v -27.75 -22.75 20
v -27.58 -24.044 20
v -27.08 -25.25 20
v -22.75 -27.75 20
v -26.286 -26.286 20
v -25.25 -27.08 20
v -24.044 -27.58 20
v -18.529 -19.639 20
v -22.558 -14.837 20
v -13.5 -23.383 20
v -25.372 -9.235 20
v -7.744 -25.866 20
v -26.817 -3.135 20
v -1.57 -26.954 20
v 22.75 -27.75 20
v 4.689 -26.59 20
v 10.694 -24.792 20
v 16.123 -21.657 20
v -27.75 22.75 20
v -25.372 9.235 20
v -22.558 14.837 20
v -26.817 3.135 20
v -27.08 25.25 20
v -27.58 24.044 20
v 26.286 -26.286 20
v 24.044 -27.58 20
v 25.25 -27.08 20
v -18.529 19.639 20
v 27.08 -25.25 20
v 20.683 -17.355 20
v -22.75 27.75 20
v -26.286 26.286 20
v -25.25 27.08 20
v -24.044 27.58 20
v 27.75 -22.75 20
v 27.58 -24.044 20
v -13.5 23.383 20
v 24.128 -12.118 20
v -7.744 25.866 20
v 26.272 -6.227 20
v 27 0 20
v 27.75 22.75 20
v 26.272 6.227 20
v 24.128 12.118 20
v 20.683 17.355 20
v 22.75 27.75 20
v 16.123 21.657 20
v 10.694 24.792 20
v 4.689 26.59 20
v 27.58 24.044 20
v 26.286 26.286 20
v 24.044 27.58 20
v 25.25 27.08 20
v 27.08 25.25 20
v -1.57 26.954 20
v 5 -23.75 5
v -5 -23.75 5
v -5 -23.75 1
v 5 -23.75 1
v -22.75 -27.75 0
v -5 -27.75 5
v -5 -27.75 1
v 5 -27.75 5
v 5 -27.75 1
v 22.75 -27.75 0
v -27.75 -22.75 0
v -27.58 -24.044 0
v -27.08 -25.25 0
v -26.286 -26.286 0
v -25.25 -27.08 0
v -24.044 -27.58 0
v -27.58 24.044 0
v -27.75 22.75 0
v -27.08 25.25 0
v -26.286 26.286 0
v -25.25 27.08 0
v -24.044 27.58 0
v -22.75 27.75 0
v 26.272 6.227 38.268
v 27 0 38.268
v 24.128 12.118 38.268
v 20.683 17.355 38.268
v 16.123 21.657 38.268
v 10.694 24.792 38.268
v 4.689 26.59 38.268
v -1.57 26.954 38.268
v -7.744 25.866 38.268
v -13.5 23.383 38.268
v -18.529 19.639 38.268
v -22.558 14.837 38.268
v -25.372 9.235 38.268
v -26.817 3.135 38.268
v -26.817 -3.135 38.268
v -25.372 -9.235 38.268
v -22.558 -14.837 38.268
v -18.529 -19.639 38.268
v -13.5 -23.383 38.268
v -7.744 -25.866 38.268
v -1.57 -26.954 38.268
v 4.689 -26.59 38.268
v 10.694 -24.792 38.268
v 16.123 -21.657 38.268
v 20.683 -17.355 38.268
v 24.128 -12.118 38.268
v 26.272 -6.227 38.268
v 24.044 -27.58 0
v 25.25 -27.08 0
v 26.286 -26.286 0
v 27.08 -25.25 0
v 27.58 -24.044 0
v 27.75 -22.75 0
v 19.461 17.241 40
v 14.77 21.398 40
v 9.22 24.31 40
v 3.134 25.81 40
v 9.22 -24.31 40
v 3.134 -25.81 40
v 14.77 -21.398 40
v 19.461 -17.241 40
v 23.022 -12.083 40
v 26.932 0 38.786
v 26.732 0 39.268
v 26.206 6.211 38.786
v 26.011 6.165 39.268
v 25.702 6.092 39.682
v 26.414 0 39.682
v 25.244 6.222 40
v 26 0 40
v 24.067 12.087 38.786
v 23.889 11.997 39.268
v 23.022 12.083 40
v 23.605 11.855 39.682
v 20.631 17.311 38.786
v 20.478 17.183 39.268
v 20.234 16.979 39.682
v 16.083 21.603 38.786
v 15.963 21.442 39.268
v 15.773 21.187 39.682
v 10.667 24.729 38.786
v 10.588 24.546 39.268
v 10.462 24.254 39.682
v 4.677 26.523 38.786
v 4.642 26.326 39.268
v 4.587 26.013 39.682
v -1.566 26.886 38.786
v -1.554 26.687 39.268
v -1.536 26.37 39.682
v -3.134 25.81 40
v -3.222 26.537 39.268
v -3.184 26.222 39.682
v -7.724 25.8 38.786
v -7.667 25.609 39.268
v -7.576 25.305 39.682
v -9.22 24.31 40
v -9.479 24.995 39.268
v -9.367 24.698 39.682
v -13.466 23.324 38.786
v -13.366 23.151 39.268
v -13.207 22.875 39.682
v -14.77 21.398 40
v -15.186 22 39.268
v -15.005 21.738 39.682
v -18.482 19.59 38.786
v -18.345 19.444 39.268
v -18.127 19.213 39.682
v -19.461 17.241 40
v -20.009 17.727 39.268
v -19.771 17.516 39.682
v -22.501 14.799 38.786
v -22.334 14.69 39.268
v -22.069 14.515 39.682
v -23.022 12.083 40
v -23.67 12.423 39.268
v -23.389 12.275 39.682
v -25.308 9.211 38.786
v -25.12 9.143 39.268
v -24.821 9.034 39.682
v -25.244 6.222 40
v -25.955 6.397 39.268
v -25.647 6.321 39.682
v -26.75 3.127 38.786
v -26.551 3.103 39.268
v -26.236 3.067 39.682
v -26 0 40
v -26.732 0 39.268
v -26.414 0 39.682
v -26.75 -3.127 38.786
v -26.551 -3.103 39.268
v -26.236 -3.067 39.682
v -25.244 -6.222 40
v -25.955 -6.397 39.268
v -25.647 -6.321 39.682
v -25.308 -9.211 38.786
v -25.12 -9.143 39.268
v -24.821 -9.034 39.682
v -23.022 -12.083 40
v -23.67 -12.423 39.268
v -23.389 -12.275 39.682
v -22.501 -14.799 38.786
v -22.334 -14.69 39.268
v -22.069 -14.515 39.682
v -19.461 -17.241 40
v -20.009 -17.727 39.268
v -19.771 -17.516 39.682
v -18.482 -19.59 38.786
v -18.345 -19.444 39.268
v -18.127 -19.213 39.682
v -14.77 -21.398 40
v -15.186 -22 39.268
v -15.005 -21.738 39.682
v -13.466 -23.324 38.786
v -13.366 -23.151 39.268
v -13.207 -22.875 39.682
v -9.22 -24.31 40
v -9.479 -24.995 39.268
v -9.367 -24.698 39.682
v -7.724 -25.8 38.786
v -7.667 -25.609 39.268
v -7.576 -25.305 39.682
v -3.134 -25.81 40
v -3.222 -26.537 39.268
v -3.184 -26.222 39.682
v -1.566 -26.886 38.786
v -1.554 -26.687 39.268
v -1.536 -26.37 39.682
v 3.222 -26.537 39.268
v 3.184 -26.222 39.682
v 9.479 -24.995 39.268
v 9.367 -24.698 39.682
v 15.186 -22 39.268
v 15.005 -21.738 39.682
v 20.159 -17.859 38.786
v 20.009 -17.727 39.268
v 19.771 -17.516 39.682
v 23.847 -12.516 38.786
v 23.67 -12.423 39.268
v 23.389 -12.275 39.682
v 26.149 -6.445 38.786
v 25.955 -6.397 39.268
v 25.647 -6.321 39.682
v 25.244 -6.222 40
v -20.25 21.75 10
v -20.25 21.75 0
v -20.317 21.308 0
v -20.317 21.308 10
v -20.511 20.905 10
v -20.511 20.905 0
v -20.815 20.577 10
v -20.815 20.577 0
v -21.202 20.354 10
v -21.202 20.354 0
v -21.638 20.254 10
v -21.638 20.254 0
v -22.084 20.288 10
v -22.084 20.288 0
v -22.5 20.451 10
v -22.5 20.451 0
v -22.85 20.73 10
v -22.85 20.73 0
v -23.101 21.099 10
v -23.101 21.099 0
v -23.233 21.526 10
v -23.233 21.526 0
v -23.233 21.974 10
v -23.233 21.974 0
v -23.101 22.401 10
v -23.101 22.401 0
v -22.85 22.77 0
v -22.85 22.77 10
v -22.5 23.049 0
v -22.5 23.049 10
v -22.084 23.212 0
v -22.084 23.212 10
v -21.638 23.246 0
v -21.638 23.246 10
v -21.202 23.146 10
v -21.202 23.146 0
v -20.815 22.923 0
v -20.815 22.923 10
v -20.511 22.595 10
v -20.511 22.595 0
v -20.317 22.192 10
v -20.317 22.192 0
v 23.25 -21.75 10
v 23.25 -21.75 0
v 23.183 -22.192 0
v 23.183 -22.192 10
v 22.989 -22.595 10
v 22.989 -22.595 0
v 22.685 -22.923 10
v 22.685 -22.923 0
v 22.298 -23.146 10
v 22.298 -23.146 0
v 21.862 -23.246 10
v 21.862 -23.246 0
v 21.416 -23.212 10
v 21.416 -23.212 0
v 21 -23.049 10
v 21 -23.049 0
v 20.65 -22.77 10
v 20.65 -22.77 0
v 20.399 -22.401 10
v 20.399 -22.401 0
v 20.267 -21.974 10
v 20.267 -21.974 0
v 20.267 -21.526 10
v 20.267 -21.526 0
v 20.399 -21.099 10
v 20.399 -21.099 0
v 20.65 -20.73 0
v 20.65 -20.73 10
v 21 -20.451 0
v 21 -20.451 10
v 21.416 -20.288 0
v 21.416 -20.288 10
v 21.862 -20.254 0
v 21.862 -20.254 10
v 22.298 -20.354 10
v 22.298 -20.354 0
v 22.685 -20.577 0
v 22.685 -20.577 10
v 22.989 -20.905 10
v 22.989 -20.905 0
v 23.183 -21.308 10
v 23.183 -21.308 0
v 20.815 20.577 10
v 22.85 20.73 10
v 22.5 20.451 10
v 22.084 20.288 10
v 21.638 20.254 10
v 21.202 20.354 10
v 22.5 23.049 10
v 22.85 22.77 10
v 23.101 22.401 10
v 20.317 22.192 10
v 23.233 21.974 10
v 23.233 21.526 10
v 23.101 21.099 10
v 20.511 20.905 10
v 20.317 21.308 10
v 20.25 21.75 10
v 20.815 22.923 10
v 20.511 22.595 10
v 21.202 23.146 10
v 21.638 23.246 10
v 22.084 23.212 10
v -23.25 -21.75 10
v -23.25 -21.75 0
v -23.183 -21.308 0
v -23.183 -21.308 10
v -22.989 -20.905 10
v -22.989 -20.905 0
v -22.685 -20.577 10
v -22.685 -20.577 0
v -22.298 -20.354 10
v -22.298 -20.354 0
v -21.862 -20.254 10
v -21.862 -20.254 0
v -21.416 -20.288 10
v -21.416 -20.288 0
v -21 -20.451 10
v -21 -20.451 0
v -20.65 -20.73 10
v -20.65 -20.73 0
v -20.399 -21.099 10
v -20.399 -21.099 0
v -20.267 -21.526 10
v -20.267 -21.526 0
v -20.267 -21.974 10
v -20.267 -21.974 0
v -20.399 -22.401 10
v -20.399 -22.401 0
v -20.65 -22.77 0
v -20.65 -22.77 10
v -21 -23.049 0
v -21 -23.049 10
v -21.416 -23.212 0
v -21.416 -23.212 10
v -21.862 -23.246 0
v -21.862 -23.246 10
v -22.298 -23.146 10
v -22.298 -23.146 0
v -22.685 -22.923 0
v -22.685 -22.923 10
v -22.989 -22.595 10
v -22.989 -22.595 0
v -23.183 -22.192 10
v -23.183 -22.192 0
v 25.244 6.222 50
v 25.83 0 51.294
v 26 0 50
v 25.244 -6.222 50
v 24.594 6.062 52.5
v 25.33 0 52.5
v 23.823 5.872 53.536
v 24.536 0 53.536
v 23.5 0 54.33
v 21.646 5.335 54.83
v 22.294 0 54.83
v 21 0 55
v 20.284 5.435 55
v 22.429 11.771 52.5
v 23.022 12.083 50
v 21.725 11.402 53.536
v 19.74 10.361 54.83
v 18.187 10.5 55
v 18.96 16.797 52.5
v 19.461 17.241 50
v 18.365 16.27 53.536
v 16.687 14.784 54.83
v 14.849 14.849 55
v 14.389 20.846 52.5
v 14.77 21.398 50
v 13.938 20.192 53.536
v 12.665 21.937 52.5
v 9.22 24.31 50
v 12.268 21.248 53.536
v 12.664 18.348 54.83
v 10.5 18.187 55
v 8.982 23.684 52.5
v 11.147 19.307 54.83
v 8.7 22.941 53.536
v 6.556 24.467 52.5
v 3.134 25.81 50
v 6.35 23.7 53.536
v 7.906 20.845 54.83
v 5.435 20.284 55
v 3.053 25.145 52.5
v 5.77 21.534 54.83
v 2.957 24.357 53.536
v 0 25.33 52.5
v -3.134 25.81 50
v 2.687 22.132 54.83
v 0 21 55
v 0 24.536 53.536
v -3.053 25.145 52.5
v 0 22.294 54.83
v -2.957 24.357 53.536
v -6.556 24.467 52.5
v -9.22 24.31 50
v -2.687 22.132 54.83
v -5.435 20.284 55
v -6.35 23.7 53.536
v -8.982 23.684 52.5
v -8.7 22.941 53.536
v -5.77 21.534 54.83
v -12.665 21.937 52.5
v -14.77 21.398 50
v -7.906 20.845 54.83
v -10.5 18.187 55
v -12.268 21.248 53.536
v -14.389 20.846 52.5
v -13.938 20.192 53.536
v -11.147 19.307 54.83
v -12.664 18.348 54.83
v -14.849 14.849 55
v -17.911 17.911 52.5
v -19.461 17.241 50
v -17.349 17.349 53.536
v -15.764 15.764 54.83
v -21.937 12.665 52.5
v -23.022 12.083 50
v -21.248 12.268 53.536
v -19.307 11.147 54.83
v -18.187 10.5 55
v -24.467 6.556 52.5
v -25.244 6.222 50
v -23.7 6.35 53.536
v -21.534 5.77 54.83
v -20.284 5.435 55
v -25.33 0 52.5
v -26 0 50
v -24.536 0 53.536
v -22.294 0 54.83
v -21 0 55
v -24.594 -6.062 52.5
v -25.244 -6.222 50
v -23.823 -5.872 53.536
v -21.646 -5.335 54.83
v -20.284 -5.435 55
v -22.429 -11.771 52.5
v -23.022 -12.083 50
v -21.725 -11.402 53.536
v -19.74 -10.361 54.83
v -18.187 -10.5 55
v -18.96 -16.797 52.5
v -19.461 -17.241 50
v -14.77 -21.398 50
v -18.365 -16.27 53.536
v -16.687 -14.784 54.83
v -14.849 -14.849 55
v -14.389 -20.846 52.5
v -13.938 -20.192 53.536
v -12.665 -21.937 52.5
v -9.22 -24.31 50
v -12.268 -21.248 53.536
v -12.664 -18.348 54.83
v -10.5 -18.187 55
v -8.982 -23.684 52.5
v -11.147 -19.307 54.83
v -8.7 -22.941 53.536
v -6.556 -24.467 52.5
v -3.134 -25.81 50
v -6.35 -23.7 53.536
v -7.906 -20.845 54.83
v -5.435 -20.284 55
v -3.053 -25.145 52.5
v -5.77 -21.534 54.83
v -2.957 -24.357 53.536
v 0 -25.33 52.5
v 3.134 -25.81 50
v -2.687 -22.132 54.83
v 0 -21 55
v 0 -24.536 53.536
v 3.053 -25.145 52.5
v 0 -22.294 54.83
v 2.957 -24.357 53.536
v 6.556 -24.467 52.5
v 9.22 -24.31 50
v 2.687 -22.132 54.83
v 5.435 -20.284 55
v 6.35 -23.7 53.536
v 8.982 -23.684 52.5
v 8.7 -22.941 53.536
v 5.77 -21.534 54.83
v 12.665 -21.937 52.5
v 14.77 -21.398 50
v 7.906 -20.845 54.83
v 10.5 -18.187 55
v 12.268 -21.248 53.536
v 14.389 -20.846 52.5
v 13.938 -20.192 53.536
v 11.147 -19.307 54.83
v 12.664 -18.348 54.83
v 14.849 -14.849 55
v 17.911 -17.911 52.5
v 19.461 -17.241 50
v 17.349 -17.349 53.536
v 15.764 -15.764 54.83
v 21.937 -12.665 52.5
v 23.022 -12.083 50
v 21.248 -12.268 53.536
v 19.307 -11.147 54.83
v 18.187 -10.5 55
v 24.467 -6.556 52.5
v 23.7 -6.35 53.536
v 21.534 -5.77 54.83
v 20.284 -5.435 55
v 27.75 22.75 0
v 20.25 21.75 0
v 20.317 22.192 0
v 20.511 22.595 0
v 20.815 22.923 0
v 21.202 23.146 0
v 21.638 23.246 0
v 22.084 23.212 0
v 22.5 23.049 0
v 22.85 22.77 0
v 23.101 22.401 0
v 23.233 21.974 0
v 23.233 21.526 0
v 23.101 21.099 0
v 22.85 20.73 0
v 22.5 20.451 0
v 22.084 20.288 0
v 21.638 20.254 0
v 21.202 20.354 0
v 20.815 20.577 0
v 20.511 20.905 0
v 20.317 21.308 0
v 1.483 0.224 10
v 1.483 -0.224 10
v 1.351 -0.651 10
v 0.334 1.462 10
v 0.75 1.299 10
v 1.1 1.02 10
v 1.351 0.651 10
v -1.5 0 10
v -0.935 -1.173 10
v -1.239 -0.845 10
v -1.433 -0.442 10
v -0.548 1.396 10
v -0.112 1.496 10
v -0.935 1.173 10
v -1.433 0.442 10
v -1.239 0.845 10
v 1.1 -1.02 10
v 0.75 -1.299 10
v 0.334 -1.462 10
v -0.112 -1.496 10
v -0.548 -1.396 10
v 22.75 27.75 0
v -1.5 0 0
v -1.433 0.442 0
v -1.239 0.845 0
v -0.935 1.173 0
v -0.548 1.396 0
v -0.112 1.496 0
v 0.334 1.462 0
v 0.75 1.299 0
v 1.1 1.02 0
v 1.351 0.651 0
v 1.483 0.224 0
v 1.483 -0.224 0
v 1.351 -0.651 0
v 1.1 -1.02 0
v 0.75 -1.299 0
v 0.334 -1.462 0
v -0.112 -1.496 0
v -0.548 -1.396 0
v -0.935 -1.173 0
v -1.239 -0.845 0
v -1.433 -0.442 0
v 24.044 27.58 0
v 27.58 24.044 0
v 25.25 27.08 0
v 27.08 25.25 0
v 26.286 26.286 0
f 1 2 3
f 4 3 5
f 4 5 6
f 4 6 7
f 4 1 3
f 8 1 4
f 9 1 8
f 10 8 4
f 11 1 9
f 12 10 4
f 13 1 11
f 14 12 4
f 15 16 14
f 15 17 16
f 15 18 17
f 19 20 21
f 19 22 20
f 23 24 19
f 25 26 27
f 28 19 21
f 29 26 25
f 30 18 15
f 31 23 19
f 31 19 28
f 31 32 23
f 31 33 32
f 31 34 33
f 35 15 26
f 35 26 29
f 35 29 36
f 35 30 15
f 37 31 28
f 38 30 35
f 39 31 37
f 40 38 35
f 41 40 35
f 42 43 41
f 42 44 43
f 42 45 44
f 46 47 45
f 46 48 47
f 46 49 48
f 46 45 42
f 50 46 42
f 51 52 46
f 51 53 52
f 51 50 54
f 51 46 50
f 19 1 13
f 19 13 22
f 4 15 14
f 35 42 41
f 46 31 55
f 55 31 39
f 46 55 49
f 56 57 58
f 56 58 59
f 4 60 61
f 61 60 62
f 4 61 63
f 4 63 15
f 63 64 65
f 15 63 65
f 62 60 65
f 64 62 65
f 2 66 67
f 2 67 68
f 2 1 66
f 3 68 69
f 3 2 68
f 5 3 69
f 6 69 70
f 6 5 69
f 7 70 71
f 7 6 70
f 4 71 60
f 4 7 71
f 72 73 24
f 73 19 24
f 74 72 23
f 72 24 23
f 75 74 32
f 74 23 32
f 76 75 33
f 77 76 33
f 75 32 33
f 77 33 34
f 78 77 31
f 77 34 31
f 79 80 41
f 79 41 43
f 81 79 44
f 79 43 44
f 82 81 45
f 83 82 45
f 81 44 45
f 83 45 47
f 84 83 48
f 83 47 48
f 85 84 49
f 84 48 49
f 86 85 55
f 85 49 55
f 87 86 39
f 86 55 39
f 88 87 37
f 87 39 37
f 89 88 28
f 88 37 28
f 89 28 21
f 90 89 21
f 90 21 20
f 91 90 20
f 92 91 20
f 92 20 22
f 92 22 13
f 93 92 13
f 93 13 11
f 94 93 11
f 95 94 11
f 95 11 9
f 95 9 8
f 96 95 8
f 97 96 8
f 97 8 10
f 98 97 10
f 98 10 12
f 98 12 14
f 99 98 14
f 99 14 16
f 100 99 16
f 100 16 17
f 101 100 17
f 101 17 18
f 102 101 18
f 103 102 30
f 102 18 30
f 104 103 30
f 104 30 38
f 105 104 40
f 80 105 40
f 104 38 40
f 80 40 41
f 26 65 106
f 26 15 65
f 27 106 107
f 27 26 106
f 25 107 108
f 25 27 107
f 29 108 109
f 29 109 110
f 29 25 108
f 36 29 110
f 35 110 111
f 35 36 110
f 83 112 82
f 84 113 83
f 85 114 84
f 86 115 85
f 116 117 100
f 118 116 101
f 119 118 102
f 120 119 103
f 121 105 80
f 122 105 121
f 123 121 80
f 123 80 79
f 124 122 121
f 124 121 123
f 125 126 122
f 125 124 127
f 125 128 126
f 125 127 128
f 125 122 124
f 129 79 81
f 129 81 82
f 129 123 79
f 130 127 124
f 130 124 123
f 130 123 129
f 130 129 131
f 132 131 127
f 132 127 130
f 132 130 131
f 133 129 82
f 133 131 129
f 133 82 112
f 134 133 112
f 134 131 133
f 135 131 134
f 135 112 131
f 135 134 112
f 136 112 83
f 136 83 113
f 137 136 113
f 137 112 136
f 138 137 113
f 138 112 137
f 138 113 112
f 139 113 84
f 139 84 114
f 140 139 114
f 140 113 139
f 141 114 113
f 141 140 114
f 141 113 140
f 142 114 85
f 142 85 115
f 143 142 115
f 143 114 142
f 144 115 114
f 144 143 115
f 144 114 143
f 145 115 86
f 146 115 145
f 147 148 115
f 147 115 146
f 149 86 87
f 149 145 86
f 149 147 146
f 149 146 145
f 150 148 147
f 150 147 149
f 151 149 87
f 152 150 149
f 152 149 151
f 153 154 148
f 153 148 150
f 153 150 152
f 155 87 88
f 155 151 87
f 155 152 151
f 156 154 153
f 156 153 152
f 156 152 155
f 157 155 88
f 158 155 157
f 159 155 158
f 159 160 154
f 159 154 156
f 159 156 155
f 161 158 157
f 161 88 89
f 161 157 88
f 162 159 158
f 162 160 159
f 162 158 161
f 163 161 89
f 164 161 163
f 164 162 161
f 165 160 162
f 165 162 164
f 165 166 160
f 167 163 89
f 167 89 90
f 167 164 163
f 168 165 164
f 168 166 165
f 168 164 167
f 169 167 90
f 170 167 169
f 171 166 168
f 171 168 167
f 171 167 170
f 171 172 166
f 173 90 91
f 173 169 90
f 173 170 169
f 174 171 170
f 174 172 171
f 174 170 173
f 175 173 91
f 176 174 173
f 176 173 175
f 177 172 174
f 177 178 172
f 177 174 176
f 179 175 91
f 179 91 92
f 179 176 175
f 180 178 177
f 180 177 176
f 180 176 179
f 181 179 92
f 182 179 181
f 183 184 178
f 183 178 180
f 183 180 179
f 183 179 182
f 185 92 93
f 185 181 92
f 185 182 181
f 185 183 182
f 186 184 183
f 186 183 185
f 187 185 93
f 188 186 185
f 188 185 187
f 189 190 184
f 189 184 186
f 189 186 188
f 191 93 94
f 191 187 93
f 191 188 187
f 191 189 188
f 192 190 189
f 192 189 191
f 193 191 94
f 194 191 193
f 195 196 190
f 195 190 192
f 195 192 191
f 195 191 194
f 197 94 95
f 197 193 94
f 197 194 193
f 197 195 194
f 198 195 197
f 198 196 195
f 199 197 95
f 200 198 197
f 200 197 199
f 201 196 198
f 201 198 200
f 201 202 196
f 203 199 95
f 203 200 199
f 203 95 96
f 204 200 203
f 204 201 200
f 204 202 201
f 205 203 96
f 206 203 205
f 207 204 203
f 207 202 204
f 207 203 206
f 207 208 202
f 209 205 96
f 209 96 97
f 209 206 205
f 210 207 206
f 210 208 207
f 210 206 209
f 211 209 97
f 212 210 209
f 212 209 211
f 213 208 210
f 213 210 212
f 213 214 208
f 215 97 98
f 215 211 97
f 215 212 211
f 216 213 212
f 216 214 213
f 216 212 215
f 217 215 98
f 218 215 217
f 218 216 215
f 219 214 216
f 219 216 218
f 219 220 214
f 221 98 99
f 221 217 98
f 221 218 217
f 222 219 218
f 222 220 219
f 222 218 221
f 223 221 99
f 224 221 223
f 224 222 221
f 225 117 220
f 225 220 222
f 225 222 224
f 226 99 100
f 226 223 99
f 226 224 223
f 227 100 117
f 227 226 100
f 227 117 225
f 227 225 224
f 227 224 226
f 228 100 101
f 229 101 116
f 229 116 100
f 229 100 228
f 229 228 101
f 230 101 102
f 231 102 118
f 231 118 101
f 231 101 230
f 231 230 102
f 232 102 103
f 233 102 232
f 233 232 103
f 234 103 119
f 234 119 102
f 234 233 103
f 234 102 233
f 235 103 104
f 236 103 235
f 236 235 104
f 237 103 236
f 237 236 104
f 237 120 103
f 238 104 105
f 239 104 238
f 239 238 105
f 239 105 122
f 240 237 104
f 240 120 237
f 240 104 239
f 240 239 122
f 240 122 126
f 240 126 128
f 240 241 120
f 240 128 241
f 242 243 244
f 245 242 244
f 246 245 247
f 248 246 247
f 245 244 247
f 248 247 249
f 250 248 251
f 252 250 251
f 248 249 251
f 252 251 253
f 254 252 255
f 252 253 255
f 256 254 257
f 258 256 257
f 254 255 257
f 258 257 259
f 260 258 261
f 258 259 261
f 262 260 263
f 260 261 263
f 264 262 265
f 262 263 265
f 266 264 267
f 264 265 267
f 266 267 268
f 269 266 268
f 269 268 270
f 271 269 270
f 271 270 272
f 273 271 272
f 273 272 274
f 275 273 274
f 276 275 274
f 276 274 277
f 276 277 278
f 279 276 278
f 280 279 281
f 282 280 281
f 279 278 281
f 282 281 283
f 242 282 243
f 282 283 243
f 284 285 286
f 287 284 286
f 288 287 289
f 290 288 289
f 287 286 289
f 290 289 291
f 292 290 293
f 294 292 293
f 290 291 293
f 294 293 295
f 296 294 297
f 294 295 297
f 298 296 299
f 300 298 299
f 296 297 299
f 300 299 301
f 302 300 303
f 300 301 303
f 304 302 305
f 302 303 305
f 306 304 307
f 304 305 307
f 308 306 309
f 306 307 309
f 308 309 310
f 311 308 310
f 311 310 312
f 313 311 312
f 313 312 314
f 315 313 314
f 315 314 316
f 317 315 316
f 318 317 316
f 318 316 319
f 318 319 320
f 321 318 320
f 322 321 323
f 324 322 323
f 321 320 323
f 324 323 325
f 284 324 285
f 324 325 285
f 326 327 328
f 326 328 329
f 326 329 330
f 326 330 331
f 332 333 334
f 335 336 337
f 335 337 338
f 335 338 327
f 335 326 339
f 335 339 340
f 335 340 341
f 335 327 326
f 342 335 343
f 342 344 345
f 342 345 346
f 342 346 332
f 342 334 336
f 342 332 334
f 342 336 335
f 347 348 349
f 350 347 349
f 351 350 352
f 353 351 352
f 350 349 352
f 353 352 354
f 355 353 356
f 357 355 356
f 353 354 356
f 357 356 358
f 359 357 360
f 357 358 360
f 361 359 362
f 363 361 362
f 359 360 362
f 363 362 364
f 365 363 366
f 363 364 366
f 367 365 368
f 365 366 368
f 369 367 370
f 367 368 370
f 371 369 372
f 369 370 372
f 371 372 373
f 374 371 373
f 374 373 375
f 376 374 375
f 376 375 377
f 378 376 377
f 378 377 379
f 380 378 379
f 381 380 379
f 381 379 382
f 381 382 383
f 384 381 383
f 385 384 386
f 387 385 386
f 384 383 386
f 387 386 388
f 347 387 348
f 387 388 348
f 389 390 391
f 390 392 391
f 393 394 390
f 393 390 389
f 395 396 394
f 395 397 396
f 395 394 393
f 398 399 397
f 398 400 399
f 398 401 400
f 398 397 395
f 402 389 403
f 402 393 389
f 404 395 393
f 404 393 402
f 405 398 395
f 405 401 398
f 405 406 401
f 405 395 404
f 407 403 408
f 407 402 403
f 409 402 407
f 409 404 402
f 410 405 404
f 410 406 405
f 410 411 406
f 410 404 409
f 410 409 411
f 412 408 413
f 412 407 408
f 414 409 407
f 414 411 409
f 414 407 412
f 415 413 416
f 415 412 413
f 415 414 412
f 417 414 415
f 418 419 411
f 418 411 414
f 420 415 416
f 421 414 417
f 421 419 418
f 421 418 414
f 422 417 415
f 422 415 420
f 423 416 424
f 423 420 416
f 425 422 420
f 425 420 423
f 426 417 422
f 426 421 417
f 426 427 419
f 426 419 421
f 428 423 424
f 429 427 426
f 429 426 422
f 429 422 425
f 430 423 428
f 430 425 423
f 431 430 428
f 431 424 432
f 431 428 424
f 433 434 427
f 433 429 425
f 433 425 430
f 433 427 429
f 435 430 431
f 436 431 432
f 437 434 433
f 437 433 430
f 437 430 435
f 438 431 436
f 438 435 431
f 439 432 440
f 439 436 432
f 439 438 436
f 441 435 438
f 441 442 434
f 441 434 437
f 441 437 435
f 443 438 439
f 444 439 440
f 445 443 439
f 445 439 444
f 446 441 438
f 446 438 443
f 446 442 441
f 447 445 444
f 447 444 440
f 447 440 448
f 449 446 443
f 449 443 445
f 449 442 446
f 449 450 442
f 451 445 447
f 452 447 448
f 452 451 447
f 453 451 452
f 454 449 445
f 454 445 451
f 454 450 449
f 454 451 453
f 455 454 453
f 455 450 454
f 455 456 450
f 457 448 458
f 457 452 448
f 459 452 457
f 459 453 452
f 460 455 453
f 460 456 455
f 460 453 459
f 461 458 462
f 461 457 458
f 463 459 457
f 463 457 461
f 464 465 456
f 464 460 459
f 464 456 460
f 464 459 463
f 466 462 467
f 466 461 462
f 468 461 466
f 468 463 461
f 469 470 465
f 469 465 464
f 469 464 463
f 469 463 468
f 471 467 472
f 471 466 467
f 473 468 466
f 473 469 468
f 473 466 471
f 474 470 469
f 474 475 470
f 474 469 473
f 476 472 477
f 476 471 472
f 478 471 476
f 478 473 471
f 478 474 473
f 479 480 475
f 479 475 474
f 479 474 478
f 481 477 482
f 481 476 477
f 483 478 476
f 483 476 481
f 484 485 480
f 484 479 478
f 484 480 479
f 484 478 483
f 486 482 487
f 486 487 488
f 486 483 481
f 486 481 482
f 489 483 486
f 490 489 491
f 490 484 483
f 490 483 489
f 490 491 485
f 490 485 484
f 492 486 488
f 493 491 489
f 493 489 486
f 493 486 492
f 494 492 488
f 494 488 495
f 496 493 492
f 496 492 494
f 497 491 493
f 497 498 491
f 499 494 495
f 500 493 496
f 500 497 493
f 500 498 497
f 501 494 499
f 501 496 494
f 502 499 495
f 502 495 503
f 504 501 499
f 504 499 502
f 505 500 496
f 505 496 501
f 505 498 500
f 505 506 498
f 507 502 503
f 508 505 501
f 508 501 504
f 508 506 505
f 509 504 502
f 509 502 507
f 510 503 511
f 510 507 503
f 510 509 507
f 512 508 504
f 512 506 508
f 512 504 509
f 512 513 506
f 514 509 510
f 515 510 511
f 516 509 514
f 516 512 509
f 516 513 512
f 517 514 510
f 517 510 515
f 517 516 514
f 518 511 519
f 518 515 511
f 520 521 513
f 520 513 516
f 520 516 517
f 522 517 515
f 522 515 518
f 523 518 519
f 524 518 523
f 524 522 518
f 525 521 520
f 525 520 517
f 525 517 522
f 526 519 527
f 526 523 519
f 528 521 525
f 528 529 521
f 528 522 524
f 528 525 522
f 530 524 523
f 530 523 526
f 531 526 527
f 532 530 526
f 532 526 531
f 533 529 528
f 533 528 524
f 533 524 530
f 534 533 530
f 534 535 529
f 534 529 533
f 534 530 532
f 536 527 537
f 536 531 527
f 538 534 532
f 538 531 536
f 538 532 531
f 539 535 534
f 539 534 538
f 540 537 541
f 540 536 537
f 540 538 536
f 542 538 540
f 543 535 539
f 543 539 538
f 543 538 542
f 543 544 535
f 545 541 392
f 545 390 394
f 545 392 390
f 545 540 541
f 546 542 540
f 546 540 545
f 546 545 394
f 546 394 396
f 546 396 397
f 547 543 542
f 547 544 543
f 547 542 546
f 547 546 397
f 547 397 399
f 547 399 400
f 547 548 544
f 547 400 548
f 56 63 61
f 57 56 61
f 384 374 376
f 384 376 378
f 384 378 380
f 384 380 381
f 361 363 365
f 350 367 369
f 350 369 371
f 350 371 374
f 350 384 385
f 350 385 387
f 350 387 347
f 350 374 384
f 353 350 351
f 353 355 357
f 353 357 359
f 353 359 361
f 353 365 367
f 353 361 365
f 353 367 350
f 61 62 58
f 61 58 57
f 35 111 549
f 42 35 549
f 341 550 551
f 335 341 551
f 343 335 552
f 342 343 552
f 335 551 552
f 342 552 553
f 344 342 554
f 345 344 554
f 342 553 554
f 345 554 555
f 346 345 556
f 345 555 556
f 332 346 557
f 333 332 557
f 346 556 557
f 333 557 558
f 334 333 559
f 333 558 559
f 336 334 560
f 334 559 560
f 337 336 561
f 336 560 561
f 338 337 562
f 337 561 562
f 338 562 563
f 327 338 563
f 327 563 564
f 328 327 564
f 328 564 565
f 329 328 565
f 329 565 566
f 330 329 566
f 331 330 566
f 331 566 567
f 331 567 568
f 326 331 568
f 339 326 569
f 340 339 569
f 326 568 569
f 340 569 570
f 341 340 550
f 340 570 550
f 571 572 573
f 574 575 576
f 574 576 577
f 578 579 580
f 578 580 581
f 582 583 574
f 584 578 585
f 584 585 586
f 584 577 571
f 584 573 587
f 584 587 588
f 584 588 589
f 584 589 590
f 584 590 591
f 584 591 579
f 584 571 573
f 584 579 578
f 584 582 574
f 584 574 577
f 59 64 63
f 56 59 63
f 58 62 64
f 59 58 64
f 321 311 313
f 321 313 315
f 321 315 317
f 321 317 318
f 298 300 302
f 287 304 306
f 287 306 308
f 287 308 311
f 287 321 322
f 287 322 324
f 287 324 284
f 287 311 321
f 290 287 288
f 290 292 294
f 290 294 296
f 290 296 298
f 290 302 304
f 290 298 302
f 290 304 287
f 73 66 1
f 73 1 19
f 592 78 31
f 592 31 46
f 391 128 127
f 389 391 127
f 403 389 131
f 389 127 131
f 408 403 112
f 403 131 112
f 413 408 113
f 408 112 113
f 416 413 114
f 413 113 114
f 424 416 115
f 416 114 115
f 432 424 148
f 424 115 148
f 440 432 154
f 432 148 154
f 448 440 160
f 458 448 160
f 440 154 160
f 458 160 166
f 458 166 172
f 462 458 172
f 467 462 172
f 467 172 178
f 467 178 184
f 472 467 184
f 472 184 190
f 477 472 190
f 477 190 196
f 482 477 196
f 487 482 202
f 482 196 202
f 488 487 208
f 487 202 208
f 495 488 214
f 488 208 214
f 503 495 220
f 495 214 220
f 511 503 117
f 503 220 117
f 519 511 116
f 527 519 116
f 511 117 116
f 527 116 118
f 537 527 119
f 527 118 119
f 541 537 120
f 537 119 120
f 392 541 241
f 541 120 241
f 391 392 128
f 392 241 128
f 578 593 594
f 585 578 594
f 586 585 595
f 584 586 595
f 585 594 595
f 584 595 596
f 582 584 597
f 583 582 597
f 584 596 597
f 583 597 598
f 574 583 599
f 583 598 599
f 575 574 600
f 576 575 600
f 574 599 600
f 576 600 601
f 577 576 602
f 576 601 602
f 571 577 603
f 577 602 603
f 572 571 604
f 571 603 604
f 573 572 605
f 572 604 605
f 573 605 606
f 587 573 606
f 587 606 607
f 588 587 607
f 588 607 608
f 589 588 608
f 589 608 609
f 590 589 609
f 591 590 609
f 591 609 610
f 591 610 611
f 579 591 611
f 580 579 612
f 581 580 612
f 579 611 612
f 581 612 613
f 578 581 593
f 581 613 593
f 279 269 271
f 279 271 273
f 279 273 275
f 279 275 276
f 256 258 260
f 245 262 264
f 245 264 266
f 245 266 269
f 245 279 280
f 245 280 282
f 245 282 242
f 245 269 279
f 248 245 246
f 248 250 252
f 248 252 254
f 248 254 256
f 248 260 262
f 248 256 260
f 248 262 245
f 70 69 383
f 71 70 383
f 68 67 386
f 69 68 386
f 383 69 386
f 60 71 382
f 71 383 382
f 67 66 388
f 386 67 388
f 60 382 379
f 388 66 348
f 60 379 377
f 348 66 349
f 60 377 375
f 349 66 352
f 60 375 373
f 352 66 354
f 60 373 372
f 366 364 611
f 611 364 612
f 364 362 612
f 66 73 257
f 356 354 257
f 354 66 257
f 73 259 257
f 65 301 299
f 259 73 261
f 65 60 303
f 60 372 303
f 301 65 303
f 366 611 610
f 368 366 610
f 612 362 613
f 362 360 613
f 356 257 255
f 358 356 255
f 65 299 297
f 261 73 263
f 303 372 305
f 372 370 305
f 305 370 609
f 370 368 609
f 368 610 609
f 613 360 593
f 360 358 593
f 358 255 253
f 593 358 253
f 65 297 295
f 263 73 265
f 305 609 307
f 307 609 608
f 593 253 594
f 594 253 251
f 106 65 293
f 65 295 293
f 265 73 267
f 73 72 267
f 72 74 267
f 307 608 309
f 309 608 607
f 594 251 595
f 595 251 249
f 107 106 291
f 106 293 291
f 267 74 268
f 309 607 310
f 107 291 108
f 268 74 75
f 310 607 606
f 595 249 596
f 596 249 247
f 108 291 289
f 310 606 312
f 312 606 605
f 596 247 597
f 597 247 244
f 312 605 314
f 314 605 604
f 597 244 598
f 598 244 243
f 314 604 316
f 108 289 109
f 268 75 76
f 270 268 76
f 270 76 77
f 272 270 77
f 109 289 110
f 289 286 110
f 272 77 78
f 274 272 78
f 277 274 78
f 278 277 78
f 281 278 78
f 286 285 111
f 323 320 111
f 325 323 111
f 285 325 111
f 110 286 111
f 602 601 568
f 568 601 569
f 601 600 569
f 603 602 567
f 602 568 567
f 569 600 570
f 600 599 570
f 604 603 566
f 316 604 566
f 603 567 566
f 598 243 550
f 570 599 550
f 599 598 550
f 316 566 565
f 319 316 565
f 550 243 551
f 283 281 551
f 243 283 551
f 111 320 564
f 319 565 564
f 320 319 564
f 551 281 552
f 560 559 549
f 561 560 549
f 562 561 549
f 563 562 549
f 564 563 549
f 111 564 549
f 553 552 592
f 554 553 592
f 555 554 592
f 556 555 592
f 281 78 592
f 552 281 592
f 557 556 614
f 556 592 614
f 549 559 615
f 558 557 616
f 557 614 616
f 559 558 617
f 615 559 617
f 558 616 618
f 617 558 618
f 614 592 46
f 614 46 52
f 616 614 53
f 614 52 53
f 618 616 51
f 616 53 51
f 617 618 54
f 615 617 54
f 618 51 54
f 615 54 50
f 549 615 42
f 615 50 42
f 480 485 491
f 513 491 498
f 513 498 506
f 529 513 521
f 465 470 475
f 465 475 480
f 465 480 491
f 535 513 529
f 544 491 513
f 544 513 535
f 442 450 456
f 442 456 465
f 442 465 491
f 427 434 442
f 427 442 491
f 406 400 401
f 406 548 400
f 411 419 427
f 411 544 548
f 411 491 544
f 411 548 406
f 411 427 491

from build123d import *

# Parameters (mm, degrees)
SKETCH_1_W          = 55.5
SKETCH_1_H          = 55.5
EXTRUDE_1_DEPTH     = 20
SKETCH_2_R          = 27
EXTRUDE_3_DEPTH     = 20
SKETCH_3_R          = 26
EXTRUDE_6_DEPTH     = 15
FILLET_1_R          = 5
FILLET_2_R          = 2
FILLET_3_R          = 5
SKETCH_5_R          = 1.5
CUT_EXTRUDE_1_DEPTH = 10
SKETCH_6_W          = 5
SKETCH_6_H          = 4
CUT_EXTRUDE_2_DEPTH = 4


with BuildPart() as part:
    # 草图1 → 凸台-拉伸1 (new body)
    with BuildSketch(Plane.XY):
        Rectangle(SKETCH_1_W, SKETCH_1_H)
    extrude(amount=EXTRUDE_1_DEPTH)

    # 草图2 → 凸台-拉伸3 (add)
    with BuildSketch(Plane.XY.offset(20)):
        Circle(SKETCH_2_R)
    extrude(amount=EXTRUDE_3_DEPTH)

    # 草图3 → 凸台-拉伸6 (add)
    with BuildSketch(Plane.XY.offset(40)):
        Circle(SKETCH_3_R)
    extrude(amount=EXTRUDE_6_DEPTH)

    # 圆角1
    fillet_1_edges = [part.edges().sort_by_distance(p)[0] for p in [
        (-26, 0, 55),
    ]]
    fillet(fillet_1_edges, radius=FILLET_1_R)

    # 圆角2
    # the kernel refuses this fillet: 2 mm, written as the material it takes off along each edge
    with BuildSketch(Plane(origin=(0, 0, 40), x_dir=(1, 0, 0), z_dir=(0, -1, 0))) as fillet_2_piece_1:
        with BuildLine():
            CenterArc((25, -1.732050808), FILLET_2_R, 0, 60)
            Line((27, -1.732050808), (27.04, -1.732050808))
            Line((27.04, -1.732050808), (27.04, 0))
            Line((27.04, 0), (27, 0.04))
            ThreePointArc((27, 0.04), (26.5, 0.04), (26.02, 0.034641016))
            Line((26.02, 0.034641016), (26, 0))
        make_face()
    revolve(axis=Axis((0, 0, 40), (0, 0, 1)), mode=Mode.SUBTRACT)

    # 圆角3
    fillet_3_edges = [part.edges().sort_by_distance(p)[0] for p in [
        (-27.75, 27.75, 10),
        (27.75, 27.75, 10),
        (27.75, -27.75, 10),
        (-27.75, -27.75, 10),
    ]]
    fillet(fillet_3_edges, radius=FILLET_3_R)

    # 草图5 → 切除-拉伸1 (cut)
    with BuildSketch(Plane(origin=(0, 0, 0), x_dir=(-1, 0, 0), z_dir=(0, 0, -1))):
        Circle(SKETCH_5_R)
        with Locations((-21.75, 21.75)):
            Circle(SKETCH_5_R)
        with Locations(Location((21.75, 21.75, 0), (0, 0, 180))):
            Circle(SKETCH_5_R)
        with Locations((21.75, -21.75)):
            Circle(SKETCH_5_R)
        with Locations(Location((-21.75, -21.75, 0), (0, 0, 180))):
            Circle(SKETCH_5_R)
    extrude(amount=-CUT_EXTRUDE_1_DEPTH, mode=Mode.SUBTRACT)

    # 草图6 → 切除-拉伸2 (cut)
    with BuildSketch(Plane.XZ.offset(27.75)):
        with Locations((-2.5, 3)):
            Rectangle(SKETCH_6_W, SKETCH_6_H)
        with Locations((2.5, 3)):
            Rectangle(SKETCH_6_W, SKETCH_6_H)
    extrude(amount=-CUT_EXTRUDE_2_DEPTH, mode=Mode.SUBTRACT)


solid = part.part
